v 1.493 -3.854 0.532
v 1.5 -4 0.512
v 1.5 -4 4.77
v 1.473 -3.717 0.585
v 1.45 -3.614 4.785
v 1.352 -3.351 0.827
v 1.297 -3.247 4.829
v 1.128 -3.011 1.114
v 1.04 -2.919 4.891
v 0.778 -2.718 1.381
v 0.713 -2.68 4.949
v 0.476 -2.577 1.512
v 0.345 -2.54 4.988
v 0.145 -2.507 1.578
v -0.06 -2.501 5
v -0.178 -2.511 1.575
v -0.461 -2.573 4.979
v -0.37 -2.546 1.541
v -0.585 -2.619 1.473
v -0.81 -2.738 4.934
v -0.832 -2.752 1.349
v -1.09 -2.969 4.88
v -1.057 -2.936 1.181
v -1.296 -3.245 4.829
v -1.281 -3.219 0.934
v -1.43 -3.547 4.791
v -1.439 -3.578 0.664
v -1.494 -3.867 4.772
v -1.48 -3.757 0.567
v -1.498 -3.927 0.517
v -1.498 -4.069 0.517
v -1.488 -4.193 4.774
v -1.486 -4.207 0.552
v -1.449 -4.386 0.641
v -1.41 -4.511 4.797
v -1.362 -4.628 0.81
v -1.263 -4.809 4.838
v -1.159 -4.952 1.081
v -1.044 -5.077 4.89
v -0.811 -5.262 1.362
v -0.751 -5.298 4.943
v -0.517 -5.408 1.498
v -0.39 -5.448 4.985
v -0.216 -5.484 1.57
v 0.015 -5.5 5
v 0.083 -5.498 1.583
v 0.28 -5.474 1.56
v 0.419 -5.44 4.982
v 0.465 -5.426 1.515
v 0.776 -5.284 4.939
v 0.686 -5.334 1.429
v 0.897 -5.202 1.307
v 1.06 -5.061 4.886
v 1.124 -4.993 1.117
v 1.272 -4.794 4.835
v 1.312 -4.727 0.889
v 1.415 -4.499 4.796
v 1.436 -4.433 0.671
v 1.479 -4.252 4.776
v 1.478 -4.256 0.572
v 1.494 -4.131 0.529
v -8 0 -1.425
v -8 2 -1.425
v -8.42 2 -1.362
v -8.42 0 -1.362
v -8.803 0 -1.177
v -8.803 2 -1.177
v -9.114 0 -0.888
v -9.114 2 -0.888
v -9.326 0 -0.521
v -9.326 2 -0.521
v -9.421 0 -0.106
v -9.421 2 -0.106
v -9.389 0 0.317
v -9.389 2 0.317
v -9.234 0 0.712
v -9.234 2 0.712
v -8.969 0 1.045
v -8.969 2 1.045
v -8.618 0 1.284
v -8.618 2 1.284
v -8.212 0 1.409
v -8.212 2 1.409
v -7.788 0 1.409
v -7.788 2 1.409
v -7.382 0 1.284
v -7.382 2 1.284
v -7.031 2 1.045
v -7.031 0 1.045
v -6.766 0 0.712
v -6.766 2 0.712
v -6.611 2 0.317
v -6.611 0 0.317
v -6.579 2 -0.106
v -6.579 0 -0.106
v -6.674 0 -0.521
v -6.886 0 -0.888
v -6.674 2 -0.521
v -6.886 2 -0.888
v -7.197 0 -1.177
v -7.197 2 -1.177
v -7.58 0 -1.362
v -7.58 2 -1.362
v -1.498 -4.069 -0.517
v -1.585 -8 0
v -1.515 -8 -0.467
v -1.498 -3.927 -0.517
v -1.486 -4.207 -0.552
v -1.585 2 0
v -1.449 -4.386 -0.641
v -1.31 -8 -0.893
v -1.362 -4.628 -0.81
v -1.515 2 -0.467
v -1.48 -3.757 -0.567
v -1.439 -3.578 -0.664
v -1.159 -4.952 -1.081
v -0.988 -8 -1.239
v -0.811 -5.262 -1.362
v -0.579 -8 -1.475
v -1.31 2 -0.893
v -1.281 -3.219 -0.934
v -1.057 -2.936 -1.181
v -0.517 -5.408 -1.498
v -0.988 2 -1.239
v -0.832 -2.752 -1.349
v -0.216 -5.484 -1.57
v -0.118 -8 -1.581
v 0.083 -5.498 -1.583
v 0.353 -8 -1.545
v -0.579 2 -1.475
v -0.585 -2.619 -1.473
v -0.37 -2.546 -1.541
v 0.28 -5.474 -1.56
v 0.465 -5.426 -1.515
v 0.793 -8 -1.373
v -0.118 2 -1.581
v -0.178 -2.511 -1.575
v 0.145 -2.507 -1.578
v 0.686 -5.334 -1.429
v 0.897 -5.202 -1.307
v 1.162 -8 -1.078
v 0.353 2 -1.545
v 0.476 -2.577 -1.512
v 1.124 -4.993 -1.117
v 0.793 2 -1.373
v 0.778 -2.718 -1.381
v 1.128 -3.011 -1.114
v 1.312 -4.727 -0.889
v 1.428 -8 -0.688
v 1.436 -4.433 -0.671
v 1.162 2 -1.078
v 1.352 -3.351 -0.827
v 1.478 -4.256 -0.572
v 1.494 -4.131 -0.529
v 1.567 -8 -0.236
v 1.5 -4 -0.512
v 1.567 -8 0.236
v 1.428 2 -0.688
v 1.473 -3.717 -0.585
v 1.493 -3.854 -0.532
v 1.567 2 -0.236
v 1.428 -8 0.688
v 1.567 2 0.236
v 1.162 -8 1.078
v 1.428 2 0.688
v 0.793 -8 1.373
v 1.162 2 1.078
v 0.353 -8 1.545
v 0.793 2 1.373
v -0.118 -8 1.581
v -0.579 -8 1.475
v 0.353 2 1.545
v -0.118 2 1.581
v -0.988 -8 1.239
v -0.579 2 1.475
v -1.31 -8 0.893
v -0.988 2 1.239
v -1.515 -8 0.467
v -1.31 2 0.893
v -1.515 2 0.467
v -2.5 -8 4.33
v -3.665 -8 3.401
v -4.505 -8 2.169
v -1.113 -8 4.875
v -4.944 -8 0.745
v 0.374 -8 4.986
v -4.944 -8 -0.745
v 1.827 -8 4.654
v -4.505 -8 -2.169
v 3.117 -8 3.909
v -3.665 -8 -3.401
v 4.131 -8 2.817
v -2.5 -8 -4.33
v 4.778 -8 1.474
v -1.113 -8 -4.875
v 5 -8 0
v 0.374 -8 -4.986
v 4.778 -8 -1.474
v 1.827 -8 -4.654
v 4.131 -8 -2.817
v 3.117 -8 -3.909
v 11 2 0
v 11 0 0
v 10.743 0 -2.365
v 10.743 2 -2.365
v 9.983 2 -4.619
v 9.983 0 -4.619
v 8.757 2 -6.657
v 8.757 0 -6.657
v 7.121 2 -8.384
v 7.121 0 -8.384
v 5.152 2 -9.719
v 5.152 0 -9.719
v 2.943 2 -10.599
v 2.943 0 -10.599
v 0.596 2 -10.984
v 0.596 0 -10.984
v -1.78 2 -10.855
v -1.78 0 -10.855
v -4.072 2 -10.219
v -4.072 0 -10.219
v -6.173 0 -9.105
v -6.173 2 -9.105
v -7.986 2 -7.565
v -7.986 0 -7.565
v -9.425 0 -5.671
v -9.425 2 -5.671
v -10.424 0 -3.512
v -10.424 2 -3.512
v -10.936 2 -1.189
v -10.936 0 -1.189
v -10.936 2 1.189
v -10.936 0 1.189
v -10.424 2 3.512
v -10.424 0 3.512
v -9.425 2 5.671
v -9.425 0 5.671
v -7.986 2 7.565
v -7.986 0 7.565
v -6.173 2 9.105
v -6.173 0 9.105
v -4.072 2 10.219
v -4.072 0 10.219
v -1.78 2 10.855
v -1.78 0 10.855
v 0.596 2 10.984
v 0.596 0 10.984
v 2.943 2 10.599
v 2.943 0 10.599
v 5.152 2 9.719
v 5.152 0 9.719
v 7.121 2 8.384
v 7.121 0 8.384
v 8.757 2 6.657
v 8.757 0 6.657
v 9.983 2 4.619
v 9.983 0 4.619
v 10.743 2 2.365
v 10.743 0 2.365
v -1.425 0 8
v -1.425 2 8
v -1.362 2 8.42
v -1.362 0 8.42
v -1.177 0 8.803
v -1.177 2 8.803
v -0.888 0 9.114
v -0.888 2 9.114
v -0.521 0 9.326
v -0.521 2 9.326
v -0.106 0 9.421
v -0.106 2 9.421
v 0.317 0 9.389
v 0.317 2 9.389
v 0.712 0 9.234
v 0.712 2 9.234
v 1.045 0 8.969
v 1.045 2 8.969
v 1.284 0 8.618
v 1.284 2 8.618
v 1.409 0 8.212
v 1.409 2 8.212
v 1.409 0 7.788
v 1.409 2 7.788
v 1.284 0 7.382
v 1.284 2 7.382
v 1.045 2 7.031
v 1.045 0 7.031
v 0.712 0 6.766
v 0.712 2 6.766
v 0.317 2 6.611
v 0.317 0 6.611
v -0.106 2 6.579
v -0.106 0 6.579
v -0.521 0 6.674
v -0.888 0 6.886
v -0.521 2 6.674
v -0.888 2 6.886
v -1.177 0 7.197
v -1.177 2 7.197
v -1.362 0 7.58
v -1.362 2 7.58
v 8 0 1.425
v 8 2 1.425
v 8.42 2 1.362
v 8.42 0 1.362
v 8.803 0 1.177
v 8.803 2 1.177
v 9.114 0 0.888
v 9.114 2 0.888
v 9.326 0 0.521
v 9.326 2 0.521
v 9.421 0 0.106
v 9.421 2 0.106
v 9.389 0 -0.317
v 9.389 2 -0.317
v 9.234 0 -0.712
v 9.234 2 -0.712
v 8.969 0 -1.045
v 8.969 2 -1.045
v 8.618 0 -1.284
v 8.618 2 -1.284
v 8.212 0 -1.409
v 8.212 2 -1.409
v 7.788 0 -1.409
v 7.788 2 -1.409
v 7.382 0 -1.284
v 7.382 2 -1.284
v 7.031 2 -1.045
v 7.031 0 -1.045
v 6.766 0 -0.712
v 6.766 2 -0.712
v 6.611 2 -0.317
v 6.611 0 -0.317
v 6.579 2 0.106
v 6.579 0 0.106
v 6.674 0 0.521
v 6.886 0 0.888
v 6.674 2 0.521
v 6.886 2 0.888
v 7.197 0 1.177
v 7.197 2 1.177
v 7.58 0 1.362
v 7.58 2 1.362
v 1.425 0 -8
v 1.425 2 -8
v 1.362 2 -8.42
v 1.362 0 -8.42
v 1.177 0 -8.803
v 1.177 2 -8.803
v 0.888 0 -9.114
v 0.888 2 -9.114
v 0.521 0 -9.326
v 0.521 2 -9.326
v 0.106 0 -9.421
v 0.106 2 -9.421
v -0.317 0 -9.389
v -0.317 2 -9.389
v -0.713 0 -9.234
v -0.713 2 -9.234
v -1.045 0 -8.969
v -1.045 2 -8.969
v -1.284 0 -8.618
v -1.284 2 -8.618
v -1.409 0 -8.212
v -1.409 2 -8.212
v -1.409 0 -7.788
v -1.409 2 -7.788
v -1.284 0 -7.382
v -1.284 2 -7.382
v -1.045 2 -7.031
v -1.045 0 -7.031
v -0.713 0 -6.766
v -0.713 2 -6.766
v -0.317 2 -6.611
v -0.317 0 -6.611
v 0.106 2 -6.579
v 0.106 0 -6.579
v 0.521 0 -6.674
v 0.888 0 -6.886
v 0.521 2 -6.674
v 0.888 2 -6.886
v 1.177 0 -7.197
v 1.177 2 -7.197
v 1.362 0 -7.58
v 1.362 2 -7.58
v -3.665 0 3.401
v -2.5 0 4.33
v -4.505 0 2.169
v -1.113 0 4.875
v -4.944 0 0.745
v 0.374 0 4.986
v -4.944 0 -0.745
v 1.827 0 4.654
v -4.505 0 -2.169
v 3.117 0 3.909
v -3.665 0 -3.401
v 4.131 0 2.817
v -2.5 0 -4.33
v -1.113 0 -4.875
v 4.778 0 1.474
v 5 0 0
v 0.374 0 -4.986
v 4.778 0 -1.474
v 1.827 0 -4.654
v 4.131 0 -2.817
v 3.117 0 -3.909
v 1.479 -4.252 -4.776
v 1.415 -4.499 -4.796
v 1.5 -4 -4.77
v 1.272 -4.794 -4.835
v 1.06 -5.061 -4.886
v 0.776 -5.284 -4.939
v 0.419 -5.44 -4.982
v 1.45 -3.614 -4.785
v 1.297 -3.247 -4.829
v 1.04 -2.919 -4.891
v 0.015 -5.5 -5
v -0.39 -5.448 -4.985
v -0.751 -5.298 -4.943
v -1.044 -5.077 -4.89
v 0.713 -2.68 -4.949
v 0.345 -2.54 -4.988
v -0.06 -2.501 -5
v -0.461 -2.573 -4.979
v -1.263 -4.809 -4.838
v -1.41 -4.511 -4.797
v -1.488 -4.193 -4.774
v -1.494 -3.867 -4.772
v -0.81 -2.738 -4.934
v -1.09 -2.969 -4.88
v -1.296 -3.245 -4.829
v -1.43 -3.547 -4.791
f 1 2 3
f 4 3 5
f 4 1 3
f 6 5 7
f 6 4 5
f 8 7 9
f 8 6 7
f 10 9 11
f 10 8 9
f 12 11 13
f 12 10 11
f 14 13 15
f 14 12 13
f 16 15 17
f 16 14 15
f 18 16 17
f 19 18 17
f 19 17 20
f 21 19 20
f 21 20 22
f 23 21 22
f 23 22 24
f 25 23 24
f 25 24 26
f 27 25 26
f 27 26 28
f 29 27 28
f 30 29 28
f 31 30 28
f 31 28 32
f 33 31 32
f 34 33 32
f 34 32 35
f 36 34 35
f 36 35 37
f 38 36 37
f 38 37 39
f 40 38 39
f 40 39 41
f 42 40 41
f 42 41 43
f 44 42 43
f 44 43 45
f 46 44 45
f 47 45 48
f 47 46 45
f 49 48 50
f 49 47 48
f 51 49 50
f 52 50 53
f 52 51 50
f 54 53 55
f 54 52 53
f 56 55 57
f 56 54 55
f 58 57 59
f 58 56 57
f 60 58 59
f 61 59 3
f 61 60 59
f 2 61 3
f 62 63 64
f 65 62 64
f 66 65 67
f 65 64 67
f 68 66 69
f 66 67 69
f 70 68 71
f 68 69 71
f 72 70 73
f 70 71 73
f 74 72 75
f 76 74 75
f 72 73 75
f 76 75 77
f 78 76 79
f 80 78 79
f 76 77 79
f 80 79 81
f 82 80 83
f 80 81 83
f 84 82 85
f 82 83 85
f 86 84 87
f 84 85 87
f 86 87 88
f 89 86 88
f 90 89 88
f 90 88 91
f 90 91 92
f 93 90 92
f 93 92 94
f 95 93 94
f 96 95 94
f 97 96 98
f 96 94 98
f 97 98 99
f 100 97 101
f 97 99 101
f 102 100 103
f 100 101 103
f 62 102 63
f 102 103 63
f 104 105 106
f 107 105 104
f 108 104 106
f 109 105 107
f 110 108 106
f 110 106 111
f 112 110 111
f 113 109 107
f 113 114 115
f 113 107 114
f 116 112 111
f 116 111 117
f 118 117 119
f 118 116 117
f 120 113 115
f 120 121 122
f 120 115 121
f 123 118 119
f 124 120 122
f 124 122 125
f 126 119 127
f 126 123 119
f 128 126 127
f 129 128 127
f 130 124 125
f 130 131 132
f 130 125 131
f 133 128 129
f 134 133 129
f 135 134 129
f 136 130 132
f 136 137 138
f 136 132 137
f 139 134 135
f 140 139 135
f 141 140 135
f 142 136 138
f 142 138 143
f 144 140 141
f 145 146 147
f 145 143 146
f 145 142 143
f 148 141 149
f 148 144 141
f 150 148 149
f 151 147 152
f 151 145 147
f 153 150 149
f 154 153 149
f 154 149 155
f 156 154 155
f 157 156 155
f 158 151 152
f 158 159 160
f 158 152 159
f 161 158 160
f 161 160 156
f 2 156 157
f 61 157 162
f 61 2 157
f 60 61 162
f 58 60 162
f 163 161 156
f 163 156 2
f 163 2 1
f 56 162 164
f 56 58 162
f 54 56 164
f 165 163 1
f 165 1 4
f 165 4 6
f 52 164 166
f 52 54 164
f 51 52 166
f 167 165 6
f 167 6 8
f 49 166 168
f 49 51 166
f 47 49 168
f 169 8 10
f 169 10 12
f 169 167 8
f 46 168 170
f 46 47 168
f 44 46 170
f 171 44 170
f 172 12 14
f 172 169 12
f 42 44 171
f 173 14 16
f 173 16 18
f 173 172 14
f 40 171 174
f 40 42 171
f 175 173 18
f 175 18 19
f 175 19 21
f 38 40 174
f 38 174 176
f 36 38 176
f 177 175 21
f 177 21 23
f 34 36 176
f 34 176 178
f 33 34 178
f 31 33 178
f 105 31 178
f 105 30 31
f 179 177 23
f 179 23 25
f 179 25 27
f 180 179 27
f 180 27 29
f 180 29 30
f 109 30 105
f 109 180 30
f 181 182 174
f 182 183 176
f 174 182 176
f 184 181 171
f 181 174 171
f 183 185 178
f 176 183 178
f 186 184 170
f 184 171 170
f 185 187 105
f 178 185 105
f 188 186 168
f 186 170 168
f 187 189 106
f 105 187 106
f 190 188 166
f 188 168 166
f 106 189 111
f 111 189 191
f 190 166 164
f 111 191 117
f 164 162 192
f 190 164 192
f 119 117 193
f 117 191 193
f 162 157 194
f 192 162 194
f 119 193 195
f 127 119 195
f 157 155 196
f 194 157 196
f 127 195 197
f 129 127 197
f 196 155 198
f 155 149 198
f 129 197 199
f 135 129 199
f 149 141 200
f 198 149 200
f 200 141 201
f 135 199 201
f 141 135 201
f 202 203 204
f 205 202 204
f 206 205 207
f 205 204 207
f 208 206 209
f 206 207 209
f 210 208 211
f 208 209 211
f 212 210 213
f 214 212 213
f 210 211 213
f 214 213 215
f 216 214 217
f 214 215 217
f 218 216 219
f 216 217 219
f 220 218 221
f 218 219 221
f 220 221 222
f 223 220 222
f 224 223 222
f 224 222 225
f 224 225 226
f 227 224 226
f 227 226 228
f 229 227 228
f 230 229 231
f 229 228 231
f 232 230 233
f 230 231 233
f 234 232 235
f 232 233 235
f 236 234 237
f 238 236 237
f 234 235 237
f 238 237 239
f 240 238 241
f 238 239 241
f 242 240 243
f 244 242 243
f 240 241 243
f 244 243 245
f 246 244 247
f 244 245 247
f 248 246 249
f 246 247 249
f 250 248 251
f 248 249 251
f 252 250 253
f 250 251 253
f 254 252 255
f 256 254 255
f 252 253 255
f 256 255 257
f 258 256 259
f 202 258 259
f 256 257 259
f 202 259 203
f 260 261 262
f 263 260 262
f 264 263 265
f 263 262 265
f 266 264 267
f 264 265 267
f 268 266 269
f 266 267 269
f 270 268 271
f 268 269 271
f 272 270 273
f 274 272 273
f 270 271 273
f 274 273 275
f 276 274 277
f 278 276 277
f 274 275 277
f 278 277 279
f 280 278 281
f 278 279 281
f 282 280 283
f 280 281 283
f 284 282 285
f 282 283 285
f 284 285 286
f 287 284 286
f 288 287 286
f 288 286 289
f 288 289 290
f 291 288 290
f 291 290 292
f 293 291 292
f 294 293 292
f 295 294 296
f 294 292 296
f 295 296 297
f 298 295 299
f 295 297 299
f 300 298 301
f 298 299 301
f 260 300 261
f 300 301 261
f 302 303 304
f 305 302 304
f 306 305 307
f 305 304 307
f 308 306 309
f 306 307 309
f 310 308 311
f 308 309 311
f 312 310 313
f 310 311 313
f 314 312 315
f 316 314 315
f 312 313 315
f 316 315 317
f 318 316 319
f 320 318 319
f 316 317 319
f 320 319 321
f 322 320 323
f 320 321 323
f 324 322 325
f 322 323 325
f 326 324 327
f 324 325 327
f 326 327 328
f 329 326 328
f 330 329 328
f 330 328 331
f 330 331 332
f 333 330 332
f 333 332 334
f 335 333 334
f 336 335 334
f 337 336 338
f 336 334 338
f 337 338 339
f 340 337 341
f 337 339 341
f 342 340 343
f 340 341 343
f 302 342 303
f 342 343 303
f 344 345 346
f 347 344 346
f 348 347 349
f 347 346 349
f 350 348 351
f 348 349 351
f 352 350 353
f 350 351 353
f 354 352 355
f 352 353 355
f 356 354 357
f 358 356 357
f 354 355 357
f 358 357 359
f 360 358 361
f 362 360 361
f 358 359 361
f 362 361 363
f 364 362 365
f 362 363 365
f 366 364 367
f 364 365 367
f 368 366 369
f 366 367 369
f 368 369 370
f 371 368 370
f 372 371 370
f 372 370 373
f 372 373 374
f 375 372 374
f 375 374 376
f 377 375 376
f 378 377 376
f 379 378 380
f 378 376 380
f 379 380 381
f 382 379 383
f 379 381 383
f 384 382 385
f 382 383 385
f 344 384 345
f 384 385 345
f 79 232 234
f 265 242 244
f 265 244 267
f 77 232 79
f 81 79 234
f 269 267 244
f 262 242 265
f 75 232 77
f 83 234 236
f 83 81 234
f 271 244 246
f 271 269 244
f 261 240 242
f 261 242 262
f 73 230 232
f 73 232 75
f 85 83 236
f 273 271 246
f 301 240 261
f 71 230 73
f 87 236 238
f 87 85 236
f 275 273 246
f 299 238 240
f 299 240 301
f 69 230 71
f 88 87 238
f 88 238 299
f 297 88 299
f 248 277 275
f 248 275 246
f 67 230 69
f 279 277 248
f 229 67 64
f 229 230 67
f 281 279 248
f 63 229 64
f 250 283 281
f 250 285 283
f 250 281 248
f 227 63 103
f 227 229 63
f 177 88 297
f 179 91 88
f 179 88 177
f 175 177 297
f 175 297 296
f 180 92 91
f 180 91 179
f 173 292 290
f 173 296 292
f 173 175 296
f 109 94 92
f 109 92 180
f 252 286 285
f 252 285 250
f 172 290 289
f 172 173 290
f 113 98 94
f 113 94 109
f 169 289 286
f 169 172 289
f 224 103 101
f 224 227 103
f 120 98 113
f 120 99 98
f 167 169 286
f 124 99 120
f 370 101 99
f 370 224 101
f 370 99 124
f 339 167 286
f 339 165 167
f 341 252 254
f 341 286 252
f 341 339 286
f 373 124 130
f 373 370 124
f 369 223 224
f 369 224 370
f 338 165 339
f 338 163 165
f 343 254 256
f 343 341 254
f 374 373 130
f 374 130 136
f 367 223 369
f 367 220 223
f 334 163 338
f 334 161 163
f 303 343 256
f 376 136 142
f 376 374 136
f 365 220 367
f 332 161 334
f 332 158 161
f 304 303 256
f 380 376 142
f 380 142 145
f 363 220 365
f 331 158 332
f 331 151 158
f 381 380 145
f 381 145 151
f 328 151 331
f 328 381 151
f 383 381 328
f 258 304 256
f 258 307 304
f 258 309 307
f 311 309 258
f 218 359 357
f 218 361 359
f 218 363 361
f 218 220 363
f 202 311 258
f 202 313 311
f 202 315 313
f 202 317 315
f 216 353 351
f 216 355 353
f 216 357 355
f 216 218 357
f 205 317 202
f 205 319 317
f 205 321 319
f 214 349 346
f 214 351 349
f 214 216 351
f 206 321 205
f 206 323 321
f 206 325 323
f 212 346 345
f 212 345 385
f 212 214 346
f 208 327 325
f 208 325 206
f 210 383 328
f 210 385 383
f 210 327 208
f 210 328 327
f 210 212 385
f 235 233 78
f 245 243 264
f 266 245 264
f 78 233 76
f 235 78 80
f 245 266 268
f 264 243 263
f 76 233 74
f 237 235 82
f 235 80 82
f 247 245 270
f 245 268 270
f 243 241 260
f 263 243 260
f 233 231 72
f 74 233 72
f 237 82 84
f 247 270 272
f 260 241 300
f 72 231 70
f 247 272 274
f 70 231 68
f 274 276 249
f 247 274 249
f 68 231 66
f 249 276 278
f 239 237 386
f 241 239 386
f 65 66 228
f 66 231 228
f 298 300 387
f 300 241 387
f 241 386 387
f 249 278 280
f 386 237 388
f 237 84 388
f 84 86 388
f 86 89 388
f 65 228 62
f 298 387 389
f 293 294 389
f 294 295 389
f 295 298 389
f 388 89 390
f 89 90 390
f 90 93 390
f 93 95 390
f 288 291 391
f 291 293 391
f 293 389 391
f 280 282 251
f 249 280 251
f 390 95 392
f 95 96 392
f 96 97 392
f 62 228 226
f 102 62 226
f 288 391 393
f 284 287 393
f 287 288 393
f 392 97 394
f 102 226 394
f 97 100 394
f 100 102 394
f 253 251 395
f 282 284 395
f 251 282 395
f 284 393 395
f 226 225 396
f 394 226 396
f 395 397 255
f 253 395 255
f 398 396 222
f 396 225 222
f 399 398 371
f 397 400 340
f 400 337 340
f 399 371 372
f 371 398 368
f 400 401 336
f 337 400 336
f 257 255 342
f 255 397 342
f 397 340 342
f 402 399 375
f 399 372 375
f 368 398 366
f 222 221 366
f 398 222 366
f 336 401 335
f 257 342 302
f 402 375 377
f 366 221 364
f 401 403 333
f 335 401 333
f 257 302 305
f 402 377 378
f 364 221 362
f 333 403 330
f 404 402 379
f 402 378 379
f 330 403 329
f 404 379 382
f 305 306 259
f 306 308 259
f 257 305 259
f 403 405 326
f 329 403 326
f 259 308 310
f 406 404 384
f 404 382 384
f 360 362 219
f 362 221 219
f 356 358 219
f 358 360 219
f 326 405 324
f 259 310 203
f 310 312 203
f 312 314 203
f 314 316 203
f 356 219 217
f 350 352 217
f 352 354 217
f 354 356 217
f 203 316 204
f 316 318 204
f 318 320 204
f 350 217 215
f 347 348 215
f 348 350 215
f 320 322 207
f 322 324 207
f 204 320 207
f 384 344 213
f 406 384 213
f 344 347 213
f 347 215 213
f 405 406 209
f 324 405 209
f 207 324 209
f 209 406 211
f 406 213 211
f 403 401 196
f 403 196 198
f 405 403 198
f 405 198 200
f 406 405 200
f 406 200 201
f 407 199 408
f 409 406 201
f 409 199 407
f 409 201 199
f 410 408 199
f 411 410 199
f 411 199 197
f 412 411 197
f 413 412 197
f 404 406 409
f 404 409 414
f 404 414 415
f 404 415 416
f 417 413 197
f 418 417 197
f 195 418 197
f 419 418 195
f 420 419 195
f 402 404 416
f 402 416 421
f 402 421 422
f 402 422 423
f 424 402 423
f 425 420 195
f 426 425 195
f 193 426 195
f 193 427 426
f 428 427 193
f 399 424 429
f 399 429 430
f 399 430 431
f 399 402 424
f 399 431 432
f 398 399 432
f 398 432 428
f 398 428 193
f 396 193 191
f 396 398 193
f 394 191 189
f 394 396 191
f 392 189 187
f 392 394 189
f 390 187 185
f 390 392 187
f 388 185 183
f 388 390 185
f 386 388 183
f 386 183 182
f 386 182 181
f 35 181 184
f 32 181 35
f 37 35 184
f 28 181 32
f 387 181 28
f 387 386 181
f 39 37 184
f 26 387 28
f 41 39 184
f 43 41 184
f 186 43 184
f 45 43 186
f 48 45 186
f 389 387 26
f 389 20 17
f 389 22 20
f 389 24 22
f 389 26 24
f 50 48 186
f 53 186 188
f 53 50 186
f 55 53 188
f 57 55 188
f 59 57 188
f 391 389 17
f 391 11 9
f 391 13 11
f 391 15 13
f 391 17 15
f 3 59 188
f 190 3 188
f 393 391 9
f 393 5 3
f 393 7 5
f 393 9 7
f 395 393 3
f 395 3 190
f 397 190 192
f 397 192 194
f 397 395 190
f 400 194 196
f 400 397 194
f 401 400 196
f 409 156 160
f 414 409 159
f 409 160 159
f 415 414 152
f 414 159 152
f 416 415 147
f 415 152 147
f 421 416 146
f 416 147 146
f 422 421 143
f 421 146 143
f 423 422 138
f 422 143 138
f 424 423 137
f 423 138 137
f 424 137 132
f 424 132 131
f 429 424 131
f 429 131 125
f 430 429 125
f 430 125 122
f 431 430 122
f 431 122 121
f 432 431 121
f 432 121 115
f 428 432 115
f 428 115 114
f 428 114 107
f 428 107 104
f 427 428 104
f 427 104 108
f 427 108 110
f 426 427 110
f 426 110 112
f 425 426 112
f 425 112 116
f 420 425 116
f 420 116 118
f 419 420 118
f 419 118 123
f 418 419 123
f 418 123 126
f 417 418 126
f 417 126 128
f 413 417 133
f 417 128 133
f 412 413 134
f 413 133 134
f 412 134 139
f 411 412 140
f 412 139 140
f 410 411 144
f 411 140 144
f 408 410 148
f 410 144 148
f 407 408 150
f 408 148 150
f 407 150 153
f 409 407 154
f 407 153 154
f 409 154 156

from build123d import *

# Parameters (mm, degrees)
SKETCH1_R               = 11
BOSS_EXTRUDE1_DEPTH     = 2
SKETCH2_R               = 5
BOSS_EXTRUDE2_DEPTH     = 8
SKETCH3_R               = 1.585
CUT_EXTRUDE1_DEPTH      = 11
SKETCH4_R               = 1.425
CUT_EXTRUDE2_DEPTH      = 2
CIRPATTERN1_COUNT       = 4
SKETCH5_R               = 1.5
CUT_EXTRUDE3_DEPTH      = 12
CUT_EXTRUDE3_DEPTH_BACK = 12


with BuildPart() as part:
    # Sketch1 → Boss-Extrude1 (new body)
    with BuildSketch(Plane(origin=(0, 0, 0), x_dir=(1, 0, 0), z_dir=(0, 1, 0))):
        Circle(SKETCH1_R)
    extrude(amount=BOSS_EXTRUDE1_DEPTH)

    # Sketch2 → Boss-Extrude2 (add)
    with BuildSketch(Plane(origin=(0, 0, 0), x_dir=(1, 0, 0), z_dir=(0, 1, 0))):
        Circle(SKETCH2_R)
    extrude(amount=-BOSS_EXTRUDE2_DEPTH)

    # Sketch3 → Cut-Extrude1 (cut, through all)
    with BuildSketch(Plane(origin=(0, 2, 0), x_dir=(-1, 0, 0), z_dir=(0, -1, 0))):
        Circle(SKETCH3_R)
    extrude(amount=CUT_EXTRUDE1_DEPTH, mode=Mode.SUBTRACT)

    # Sketch4 → Cut-Extrude2 (cut)
    with BuildSketch(Plane(origin=(0, 2, 0), x_dir=(1, 0, 0), z_dir=(0, 1, 0))):
        with Locations((0, 8)):
            Circle(SKETCH4_R)
    cut_extrude2 = extrude(amount=-CUT_EXTRUDE2_DEPTH, mode=Mode.SUBTRACT)

    # CirPattern1: Cut-Extrude2 ×4 about axis
    cirpattern1_axis = Axis((0, 0, 0), (0, 1, 0))
    for i in range(1, CIRPATTERN1_COUNT):
        add(cut_extrude2.rotate(cirpattern1_axis, i * 360 / CIRPATTERN1_COUNT), mode=Mode.SUBTRACT)

    # Sketch5 → Cut-Extrude3 (cut, two sides)
    with BuildSketch(Plane.XY) as cut_extrude3_sk:
        with Locations((0, -4)):
            Circle(SKETCH5_R)
    extrude(amount=CUT_EXTRUDE3_DEPTH, mode=Mode.SUBTRACT)
    extrude(cut_extrude3_sk.sketch, amount=-CUT_EXTRUDE3_DEPTH_BACK, mode=Mode.SUBTRACT)


solid = part.part
